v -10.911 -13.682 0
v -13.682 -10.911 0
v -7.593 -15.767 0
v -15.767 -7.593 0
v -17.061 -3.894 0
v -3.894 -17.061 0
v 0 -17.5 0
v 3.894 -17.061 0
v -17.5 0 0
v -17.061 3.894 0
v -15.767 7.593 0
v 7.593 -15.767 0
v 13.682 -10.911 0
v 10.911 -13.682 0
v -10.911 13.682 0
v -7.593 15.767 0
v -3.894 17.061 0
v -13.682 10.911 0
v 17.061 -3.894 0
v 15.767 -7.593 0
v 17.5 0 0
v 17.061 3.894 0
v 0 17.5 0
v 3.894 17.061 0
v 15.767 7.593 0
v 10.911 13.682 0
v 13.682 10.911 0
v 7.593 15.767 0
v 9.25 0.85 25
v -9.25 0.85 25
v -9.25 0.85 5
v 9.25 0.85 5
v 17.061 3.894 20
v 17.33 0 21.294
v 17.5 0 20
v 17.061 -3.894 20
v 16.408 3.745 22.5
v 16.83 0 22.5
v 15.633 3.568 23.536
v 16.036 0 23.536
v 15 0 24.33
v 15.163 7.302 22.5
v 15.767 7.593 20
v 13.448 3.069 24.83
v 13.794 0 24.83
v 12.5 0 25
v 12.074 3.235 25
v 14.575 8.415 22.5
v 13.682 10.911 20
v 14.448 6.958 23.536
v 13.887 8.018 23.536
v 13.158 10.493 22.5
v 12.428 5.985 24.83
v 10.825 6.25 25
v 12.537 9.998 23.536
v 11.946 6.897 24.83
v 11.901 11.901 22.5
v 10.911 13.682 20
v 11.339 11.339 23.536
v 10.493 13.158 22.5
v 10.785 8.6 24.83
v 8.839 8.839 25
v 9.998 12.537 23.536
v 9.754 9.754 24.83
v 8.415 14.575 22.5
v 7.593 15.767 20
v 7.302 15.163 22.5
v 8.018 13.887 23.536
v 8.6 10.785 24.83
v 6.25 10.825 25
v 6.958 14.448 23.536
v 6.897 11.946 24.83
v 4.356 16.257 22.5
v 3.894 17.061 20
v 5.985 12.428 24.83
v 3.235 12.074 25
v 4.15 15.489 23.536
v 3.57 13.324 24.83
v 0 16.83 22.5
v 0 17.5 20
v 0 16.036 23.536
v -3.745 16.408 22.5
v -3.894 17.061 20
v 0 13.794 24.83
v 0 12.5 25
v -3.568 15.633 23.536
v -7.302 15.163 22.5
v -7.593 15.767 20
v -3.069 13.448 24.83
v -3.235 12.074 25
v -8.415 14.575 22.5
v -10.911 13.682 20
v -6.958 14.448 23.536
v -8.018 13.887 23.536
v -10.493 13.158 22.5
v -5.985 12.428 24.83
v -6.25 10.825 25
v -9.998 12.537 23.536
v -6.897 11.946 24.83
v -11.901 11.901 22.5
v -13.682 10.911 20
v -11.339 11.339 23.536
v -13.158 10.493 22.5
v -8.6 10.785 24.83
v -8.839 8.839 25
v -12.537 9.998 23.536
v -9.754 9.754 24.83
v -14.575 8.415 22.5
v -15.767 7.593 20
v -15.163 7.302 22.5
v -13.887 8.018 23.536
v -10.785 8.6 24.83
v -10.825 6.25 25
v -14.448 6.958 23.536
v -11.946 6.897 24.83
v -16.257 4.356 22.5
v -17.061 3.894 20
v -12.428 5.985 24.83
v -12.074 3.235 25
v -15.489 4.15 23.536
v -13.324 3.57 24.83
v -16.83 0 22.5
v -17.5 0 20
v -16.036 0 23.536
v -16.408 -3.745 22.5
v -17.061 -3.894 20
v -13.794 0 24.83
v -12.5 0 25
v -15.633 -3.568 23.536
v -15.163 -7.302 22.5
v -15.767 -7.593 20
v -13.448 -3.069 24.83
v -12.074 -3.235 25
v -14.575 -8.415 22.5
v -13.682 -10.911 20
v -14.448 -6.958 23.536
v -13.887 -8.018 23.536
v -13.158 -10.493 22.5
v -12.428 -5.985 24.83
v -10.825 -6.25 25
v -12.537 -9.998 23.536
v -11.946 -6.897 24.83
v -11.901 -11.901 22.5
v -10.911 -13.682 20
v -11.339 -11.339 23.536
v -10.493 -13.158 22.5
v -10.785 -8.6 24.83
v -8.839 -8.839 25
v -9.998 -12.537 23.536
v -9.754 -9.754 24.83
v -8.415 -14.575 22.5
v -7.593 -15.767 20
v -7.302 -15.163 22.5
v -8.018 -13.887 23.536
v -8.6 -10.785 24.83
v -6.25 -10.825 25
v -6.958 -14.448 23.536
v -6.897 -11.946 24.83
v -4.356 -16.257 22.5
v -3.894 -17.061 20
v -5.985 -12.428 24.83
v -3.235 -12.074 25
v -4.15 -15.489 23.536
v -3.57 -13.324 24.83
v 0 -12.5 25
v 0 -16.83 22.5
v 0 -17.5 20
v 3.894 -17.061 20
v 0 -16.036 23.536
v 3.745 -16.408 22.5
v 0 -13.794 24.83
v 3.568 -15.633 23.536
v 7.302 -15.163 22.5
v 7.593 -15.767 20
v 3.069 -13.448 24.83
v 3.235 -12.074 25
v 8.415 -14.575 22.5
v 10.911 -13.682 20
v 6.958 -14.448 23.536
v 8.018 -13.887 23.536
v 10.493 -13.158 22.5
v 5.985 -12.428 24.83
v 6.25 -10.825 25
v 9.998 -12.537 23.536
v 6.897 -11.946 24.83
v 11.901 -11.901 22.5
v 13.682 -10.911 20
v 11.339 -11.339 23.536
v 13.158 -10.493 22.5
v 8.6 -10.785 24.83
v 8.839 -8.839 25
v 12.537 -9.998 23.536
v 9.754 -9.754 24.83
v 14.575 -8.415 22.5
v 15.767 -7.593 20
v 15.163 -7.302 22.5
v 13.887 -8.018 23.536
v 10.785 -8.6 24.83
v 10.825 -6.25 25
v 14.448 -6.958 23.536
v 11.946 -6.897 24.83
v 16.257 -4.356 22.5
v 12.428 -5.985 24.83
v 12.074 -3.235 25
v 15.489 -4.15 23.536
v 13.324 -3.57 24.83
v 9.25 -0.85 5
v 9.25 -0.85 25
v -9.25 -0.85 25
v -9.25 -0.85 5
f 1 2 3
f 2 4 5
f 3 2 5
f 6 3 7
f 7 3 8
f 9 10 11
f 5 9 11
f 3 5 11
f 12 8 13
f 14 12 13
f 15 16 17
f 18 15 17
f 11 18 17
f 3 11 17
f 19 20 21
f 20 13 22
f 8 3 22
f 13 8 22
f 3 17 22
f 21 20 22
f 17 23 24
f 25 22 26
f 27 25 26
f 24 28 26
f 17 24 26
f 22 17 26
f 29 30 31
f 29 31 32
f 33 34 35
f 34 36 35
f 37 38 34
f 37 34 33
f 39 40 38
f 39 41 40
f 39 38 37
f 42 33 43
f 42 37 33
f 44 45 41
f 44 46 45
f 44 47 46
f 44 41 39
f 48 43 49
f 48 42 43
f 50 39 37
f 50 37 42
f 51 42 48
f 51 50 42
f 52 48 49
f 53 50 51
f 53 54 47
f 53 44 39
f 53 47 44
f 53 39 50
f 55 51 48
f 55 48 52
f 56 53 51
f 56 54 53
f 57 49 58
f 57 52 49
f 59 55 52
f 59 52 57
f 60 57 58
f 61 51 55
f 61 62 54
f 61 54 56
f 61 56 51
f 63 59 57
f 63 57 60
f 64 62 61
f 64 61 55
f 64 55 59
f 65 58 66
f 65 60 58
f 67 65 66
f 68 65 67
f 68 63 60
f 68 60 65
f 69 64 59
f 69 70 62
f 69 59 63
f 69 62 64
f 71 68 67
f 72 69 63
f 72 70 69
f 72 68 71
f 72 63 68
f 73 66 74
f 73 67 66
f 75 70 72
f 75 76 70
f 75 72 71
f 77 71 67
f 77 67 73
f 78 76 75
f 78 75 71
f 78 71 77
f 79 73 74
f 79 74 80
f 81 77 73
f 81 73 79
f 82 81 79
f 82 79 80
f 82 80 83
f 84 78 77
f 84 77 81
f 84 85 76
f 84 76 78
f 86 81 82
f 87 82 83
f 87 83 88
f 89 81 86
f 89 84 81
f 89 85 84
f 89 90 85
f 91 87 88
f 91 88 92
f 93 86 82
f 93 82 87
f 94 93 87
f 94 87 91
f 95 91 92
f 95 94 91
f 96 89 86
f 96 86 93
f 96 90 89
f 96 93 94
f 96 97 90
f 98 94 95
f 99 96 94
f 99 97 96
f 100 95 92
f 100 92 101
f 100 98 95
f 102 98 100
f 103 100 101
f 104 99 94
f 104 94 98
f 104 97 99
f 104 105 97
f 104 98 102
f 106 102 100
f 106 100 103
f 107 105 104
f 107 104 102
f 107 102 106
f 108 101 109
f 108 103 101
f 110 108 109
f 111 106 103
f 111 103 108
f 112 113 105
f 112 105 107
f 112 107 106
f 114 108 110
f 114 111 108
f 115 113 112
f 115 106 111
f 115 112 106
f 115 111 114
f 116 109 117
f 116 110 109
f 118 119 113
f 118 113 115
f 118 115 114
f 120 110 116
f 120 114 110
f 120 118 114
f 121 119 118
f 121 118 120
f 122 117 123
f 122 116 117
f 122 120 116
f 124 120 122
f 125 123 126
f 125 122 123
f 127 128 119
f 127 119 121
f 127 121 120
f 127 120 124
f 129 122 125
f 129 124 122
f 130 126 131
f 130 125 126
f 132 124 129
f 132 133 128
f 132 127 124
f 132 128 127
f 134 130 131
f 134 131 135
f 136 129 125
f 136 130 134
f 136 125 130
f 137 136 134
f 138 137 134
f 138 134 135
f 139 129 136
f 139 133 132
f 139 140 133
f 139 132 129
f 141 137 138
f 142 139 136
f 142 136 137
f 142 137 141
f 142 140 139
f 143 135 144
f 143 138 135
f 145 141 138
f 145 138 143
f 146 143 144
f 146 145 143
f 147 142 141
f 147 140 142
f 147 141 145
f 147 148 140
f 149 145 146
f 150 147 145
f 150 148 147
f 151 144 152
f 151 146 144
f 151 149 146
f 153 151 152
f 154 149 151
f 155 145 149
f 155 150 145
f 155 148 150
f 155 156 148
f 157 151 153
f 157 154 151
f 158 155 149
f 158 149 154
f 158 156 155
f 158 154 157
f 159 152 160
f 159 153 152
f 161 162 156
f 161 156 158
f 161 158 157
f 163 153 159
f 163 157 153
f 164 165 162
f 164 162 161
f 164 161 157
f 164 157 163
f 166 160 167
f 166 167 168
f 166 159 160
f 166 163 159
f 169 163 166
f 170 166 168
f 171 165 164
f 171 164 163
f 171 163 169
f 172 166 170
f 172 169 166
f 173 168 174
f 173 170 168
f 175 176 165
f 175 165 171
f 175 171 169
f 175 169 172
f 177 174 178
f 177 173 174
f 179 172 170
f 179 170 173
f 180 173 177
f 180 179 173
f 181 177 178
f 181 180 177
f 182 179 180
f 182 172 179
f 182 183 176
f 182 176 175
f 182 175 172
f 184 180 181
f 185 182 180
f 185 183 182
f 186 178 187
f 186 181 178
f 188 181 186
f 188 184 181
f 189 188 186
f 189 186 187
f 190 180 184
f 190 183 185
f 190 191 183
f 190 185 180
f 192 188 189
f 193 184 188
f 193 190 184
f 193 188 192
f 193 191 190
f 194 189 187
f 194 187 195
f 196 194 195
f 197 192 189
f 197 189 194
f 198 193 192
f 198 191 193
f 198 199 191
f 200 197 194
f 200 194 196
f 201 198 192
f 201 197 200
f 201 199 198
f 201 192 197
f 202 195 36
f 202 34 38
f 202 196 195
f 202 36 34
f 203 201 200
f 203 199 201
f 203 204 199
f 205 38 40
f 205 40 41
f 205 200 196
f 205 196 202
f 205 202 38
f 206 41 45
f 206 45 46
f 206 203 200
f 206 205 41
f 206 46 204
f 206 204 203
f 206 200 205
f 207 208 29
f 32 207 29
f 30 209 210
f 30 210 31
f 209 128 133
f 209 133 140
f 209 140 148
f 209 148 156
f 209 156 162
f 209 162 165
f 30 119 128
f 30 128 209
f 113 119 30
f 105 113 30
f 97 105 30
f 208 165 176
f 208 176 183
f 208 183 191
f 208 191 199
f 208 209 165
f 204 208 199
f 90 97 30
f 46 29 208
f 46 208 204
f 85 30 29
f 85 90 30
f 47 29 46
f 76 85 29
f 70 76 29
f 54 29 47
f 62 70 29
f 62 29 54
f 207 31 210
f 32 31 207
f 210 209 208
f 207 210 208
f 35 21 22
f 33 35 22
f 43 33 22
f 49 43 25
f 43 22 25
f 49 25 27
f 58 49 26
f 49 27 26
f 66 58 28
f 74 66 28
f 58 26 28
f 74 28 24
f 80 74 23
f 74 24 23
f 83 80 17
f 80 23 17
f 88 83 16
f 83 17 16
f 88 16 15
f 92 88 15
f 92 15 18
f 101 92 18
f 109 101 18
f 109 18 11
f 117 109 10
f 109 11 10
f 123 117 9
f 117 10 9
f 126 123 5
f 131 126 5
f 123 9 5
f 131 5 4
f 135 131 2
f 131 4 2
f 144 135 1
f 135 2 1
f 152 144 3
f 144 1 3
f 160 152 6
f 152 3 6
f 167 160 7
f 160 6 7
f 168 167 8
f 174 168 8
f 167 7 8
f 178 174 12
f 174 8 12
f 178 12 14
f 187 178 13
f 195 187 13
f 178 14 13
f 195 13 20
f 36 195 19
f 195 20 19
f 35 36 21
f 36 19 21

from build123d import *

# Parameters (mm, degrees)
F0_R     = 17.5
F1_DEPTH = 25
F2_R     = 5
F3_W     = 18.5
F3_H     = 1.7
F4_DEPTH = 20


with BuildPart() as f1:
    # F0 (on Top) → F1 (new body)
    with BuildSketch(Plane.XY):
        Circle(F0_R)
    extrude(amount=F1_DEPTH)

    # F2
    f2_edges = [f1.edges().sort_by_distance(p)[0] for p in [
        (-17.5, 0, 25),
    ]]
    fillet(f2_edges, radius=F2_R)

    # F3 (on face) → F4 (cut)
    with BuildSketch(Plane.XY.offset(25)):
        Rectangle(F3_W, F3_H)
    extrude(amount=-F4_DEPTH, mode=Mode.SUBTRACT)


solid = f1.part
